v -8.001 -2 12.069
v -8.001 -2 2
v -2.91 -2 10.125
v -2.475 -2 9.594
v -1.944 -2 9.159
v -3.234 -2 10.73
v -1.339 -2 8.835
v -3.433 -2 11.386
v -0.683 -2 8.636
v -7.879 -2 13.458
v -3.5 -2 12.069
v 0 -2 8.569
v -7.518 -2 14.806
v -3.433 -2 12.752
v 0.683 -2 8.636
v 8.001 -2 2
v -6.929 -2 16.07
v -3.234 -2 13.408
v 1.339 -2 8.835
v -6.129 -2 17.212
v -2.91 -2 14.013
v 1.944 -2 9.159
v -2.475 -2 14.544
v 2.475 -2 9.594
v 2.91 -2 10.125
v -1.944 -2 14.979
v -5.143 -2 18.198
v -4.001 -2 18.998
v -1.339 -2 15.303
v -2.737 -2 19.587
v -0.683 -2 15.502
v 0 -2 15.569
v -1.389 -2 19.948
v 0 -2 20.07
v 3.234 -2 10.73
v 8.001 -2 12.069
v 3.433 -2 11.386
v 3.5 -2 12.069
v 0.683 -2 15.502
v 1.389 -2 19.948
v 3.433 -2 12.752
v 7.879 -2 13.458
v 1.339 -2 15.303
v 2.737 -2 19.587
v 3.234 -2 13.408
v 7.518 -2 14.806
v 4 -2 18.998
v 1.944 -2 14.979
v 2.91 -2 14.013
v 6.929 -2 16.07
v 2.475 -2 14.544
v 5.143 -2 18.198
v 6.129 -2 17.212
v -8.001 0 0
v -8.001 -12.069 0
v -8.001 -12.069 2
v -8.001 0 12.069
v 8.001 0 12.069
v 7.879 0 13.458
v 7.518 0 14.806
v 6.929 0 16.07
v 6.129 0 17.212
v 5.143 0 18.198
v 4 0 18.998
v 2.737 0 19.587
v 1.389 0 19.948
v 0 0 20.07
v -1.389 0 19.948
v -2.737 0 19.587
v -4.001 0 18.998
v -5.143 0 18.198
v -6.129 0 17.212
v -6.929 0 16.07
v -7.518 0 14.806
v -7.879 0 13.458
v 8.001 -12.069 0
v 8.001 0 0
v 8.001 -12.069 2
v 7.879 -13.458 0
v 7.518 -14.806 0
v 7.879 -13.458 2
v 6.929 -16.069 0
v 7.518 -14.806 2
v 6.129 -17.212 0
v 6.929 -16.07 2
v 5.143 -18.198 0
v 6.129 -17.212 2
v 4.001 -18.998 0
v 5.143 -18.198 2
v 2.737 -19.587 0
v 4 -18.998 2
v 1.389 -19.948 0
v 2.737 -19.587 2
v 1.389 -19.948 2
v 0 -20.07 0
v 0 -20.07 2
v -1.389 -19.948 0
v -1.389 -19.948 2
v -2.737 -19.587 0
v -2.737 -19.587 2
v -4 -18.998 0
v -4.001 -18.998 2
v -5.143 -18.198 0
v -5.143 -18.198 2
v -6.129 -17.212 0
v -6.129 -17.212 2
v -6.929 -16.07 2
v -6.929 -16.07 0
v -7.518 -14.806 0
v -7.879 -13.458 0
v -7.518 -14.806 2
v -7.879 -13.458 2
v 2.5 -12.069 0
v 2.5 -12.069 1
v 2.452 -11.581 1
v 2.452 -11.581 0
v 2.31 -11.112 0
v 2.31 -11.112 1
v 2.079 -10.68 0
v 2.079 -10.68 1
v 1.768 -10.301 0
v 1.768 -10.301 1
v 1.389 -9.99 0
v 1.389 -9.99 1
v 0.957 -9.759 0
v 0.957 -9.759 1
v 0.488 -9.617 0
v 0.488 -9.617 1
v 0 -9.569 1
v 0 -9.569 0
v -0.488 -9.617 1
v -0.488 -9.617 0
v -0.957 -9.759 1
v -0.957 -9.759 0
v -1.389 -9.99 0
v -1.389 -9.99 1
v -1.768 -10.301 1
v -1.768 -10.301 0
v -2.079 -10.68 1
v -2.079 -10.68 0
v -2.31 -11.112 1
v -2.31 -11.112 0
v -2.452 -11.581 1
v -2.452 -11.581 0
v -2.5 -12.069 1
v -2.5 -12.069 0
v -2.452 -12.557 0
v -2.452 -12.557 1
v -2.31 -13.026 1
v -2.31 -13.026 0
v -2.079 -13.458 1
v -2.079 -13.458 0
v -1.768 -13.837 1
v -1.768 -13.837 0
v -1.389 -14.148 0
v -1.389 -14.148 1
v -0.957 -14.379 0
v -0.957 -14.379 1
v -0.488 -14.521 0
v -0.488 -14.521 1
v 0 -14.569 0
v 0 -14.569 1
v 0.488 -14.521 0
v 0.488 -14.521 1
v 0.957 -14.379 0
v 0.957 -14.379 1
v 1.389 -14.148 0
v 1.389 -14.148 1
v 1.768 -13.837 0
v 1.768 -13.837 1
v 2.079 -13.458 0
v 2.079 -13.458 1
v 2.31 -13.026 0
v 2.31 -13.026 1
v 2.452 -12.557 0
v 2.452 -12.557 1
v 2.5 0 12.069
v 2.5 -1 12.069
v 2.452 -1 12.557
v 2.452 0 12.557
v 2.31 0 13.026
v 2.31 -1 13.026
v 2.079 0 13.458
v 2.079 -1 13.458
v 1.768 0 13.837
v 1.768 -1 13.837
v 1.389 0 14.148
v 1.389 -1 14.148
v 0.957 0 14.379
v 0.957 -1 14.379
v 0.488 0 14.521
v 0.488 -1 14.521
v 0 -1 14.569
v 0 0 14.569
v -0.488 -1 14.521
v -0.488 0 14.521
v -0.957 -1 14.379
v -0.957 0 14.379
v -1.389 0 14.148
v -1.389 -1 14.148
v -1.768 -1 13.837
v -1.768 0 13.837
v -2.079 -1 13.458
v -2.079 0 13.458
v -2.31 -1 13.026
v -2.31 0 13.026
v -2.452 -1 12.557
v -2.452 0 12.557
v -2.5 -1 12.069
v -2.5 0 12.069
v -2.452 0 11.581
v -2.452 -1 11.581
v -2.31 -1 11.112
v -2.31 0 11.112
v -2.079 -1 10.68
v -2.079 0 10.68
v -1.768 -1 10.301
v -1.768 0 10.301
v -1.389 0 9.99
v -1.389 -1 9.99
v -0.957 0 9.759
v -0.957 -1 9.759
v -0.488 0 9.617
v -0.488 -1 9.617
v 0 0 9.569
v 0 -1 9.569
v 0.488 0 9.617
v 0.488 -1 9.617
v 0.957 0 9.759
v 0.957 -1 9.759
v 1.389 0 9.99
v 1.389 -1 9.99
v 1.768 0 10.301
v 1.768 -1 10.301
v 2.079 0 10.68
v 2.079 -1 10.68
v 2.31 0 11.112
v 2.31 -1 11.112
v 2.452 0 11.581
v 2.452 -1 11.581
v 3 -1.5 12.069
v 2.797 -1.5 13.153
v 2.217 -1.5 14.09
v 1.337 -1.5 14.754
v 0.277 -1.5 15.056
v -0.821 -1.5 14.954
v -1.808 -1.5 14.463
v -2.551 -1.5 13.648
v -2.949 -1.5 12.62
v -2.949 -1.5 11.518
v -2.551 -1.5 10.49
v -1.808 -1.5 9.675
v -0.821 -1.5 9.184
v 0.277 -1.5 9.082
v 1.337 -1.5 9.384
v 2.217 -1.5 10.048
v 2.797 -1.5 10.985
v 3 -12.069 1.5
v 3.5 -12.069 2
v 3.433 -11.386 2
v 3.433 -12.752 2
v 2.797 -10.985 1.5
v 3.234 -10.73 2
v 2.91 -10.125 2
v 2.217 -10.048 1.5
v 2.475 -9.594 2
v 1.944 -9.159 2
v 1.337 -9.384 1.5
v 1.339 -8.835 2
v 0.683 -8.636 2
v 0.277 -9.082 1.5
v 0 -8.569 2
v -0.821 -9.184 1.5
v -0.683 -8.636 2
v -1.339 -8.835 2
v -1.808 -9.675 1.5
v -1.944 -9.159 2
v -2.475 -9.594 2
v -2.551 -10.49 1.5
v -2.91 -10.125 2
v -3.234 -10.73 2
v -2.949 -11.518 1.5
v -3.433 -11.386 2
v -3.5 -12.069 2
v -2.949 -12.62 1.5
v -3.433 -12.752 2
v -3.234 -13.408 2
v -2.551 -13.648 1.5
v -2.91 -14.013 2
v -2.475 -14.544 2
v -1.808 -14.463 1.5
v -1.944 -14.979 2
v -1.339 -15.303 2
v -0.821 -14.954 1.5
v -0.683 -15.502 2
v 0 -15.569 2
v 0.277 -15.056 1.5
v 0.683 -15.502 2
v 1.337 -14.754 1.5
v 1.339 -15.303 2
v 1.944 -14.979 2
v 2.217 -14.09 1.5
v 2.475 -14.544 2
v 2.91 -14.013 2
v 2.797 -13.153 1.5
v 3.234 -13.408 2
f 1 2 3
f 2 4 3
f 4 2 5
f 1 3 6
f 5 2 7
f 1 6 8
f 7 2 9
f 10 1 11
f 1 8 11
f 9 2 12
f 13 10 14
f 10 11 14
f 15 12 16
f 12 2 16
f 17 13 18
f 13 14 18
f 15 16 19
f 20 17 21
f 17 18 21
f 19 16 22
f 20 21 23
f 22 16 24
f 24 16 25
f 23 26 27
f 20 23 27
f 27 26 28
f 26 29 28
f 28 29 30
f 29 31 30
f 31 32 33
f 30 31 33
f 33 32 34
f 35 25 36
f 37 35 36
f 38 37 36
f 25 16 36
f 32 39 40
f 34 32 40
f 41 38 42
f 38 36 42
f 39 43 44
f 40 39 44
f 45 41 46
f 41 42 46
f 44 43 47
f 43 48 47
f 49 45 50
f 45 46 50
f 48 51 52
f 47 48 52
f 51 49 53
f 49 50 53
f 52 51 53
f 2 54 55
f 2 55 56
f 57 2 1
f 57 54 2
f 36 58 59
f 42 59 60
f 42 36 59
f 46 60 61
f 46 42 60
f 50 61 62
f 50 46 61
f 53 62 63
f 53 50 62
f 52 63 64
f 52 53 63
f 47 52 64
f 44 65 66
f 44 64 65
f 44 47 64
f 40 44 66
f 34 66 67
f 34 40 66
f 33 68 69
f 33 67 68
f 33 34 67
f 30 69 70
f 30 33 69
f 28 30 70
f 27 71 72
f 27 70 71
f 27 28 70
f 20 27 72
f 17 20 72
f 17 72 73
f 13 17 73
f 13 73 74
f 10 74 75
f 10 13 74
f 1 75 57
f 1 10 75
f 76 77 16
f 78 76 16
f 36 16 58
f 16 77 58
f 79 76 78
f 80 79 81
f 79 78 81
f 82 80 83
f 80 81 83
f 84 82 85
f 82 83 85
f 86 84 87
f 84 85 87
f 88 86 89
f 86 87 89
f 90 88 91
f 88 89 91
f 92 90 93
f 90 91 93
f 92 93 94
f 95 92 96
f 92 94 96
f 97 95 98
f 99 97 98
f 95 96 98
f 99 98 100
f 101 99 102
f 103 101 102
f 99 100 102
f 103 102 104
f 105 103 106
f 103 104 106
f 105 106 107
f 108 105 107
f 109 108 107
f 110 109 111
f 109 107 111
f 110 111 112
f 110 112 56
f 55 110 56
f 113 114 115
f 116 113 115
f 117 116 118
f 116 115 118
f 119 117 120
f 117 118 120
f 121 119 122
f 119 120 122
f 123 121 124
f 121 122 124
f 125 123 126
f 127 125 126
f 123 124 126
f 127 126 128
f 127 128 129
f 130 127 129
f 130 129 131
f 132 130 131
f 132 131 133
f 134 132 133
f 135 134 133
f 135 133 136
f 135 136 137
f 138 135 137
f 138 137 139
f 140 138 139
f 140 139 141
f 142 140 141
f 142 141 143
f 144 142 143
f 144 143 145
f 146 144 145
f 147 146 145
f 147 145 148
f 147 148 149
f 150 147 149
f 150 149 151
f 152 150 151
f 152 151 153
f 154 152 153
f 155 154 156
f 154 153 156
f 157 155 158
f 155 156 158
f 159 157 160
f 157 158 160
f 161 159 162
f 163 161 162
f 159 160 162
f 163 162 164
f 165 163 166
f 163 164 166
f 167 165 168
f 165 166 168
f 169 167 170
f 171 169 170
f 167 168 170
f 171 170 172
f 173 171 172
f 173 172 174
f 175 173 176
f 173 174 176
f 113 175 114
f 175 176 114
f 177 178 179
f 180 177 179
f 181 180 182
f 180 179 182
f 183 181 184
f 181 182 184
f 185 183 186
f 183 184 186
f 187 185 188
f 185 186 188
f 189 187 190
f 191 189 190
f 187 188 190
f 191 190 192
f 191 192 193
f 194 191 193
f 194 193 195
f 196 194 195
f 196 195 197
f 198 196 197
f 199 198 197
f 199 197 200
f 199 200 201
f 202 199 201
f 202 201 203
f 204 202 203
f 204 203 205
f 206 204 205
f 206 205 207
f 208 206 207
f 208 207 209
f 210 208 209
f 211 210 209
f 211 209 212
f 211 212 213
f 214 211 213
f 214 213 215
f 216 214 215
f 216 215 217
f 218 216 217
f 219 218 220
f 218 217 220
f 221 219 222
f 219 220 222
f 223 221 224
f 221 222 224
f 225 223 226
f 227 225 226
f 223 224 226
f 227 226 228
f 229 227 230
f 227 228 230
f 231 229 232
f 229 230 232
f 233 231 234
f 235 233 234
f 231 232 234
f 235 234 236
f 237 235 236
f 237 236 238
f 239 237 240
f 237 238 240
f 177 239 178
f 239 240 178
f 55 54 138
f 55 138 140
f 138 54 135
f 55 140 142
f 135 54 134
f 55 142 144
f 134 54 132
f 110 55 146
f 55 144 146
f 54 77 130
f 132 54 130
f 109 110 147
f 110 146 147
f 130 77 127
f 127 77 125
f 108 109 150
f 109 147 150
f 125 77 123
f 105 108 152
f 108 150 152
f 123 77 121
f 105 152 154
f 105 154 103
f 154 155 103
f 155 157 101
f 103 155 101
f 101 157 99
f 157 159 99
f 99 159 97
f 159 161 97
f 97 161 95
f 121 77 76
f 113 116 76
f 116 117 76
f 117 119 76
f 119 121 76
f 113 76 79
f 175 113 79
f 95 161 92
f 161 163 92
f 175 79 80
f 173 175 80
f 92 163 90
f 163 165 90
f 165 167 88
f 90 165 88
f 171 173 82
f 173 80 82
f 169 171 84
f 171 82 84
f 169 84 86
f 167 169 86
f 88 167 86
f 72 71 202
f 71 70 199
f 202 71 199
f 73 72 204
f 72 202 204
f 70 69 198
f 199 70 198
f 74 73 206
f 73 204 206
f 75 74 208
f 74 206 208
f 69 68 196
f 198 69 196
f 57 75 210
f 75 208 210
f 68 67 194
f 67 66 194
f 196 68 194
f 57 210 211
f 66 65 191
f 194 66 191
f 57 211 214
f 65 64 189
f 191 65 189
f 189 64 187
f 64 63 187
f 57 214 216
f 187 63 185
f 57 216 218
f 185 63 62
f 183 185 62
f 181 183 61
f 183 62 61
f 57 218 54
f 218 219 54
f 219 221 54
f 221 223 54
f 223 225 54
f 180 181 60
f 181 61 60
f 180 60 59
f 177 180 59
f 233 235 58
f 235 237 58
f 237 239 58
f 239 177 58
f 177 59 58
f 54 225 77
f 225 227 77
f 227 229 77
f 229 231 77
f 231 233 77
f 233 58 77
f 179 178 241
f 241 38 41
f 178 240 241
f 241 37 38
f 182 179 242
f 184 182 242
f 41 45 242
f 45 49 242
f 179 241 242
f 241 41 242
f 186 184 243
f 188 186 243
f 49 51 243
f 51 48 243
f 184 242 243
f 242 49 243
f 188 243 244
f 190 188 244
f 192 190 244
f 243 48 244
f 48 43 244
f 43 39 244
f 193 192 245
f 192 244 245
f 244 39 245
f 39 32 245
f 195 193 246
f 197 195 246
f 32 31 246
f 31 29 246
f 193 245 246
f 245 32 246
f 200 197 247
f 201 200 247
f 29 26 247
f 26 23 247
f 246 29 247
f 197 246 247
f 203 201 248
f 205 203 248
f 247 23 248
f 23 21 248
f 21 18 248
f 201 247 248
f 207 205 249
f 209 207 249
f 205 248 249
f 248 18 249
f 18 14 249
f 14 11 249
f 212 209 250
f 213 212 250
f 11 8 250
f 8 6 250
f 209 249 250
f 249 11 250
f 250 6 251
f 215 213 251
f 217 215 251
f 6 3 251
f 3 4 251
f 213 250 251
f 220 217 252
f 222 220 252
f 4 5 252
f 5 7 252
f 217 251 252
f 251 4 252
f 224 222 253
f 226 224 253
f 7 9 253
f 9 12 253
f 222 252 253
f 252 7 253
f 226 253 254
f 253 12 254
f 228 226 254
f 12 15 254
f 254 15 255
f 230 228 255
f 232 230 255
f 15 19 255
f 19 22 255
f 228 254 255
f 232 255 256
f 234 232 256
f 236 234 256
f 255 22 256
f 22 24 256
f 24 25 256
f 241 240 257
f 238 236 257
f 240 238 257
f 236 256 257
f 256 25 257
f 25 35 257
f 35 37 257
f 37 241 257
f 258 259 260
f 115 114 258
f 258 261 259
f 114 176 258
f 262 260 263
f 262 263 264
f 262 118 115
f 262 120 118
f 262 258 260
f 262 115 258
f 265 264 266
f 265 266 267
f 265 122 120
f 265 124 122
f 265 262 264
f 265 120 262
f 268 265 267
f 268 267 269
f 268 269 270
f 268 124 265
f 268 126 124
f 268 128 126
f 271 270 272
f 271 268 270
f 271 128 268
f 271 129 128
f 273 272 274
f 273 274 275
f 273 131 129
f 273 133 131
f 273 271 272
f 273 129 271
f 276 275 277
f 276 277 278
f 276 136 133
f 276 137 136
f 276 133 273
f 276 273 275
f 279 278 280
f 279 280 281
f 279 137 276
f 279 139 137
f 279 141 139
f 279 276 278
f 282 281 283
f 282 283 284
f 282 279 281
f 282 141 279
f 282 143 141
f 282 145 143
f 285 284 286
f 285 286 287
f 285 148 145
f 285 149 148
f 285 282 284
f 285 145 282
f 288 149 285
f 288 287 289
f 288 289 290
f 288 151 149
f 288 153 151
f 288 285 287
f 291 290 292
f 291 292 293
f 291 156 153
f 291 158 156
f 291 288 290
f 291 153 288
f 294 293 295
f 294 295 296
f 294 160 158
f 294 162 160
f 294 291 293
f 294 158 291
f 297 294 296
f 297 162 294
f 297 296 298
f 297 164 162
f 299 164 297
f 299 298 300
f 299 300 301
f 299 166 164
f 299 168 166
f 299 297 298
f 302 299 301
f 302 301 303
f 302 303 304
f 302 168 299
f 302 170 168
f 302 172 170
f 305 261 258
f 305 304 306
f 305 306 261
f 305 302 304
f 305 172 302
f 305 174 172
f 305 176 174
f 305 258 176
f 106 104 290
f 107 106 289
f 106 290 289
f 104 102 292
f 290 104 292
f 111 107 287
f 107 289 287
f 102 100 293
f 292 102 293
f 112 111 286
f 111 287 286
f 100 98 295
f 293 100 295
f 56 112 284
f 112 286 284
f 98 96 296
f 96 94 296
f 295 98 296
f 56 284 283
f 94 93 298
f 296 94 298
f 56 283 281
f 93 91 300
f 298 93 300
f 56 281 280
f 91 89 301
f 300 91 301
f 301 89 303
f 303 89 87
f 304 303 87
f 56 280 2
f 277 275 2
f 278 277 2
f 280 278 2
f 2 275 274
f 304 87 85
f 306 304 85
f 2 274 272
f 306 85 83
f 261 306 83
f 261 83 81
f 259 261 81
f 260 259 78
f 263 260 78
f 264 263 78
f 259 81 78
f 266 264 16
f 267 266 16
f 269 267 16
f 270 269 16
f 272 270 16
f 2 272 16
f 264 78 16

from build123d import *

# Parameters (mm, degrees)
BOSS_EXTRUDE1_DEPTH      = 8.001
BOSS_EXTRUDE1_DEPTH_BACK = 8.001
CUT_EXTRUDE1_DEPTH       = 8.001
CUT_EXTRUDE2_DEPTH       = 8.001
SKETCH5_R                = 2.5
CUT_EXTRUDE3_DEPTH       = 10
SKETCH6_R                = 2.5
CUT_EXTRUDE4_DEPTH       = 10
CHAMFER1_SIZE            = 1


with BuildPart() as part:
    # Sketch2 → Boss-Extrude1 (new, two sides: drawn at the far end of the back side and taken through both)
    with BuildSketch(Plane(origin=(0, 0, 0), x_dir=(0, 0, -1), z_dir=(1, 0, 0)).offset(-BOSS_EXTRUDE1_DEPTH_BACK)):
        Polygon((-20.07, 0), (0, 0), (0, -20.07), (-2, -20.07), (-2, -2), (-20.07, -2), align=None)
    extrude(amount=BOSS_EXTRUDE1_DEPTH + BOSS_EXTRUDE1_DEPTH_BACK)

    # Sketch3 → Cut-Extrude1 (cut)
    with BuildSketch(Plane.XZ.offset(2)):
        with BuildLine():
            Line((-8.001, 12.069), (-12.725932728, 12.069))
            Line((-12.725932728, 12.069), (-12.725932728, 24.915681473))
            Line((-12.725932728, 24.915681473), (12.141962569, 24.915681473))
            Line((12.141962569, 24.915681473), (12.141962569, 12.069))
            Line((12.141962569, 12.069), (8.001, 12.069))
            ThreePointArc((8.001, 12.069), (0, 20.07), (-8.001, 12.069))
        make_face()
    extrude(amount=-CUT_EXTRUDE1_DEPTH, mode=Mode.SUBTRACT)

    # Sketch4 → Cut-Extrude2 (cut)
    with BuildSketch(Plane.XY.offset(2)):
        with BuildLine():
            Line((-8.001, -12.069), (-10.480924408, -12.069))
            Line((-10.480924408, -12.069), (-10.480924408, -22.641723191))
            Line((-10.480924408, -22.641723191), (9.892967081, -22.641723191))
            Line((9.892967081, -22.641723191), (9.892967081, -12.069))
            Line((9.892967081, -12.069), (8.001, -12.069))
            ThreePointArc((8.001, -12.069), (0, -20.07), (-8.001, -12.069))
        make_face()
    extrude(amount=-CUT_EXTRUDE2_DEPTH, mode=Mode.SUBTRACT)

    # Sketch5 → Cut-Extrude3 (cut)
    with BuildSketch(Plane.XY.offset(2)):
        with Locations((0, -12.069)):
            Circle(SKETCH5_R)
    extrude(amount=-CUT_EXTRUDE3_DEPTH, mode=Mode.SUBTRACT)

    # Sketch6 → Cut-Extrude4 (cut)
    with BuildSketch(Plane.XZ.offset(2)):
        with Locations((0, 12.069)):
            Circle(SKETCH6_R)
    extrude(amount=-CUT_EXTRUDE4_DEPTH, mode=Mode.SUBTRACT)

    # Chamfer1
    chamfer1_edges = [part.edges().sort_by_distance(p)[0] for p in [
        (-2.5, -2, 12.069),
        (-2.5, -12.069, 2),
    ]]
    chamfer(chamfer1_edges, length=CHAMFER1_SIZE)


solid = part.part
